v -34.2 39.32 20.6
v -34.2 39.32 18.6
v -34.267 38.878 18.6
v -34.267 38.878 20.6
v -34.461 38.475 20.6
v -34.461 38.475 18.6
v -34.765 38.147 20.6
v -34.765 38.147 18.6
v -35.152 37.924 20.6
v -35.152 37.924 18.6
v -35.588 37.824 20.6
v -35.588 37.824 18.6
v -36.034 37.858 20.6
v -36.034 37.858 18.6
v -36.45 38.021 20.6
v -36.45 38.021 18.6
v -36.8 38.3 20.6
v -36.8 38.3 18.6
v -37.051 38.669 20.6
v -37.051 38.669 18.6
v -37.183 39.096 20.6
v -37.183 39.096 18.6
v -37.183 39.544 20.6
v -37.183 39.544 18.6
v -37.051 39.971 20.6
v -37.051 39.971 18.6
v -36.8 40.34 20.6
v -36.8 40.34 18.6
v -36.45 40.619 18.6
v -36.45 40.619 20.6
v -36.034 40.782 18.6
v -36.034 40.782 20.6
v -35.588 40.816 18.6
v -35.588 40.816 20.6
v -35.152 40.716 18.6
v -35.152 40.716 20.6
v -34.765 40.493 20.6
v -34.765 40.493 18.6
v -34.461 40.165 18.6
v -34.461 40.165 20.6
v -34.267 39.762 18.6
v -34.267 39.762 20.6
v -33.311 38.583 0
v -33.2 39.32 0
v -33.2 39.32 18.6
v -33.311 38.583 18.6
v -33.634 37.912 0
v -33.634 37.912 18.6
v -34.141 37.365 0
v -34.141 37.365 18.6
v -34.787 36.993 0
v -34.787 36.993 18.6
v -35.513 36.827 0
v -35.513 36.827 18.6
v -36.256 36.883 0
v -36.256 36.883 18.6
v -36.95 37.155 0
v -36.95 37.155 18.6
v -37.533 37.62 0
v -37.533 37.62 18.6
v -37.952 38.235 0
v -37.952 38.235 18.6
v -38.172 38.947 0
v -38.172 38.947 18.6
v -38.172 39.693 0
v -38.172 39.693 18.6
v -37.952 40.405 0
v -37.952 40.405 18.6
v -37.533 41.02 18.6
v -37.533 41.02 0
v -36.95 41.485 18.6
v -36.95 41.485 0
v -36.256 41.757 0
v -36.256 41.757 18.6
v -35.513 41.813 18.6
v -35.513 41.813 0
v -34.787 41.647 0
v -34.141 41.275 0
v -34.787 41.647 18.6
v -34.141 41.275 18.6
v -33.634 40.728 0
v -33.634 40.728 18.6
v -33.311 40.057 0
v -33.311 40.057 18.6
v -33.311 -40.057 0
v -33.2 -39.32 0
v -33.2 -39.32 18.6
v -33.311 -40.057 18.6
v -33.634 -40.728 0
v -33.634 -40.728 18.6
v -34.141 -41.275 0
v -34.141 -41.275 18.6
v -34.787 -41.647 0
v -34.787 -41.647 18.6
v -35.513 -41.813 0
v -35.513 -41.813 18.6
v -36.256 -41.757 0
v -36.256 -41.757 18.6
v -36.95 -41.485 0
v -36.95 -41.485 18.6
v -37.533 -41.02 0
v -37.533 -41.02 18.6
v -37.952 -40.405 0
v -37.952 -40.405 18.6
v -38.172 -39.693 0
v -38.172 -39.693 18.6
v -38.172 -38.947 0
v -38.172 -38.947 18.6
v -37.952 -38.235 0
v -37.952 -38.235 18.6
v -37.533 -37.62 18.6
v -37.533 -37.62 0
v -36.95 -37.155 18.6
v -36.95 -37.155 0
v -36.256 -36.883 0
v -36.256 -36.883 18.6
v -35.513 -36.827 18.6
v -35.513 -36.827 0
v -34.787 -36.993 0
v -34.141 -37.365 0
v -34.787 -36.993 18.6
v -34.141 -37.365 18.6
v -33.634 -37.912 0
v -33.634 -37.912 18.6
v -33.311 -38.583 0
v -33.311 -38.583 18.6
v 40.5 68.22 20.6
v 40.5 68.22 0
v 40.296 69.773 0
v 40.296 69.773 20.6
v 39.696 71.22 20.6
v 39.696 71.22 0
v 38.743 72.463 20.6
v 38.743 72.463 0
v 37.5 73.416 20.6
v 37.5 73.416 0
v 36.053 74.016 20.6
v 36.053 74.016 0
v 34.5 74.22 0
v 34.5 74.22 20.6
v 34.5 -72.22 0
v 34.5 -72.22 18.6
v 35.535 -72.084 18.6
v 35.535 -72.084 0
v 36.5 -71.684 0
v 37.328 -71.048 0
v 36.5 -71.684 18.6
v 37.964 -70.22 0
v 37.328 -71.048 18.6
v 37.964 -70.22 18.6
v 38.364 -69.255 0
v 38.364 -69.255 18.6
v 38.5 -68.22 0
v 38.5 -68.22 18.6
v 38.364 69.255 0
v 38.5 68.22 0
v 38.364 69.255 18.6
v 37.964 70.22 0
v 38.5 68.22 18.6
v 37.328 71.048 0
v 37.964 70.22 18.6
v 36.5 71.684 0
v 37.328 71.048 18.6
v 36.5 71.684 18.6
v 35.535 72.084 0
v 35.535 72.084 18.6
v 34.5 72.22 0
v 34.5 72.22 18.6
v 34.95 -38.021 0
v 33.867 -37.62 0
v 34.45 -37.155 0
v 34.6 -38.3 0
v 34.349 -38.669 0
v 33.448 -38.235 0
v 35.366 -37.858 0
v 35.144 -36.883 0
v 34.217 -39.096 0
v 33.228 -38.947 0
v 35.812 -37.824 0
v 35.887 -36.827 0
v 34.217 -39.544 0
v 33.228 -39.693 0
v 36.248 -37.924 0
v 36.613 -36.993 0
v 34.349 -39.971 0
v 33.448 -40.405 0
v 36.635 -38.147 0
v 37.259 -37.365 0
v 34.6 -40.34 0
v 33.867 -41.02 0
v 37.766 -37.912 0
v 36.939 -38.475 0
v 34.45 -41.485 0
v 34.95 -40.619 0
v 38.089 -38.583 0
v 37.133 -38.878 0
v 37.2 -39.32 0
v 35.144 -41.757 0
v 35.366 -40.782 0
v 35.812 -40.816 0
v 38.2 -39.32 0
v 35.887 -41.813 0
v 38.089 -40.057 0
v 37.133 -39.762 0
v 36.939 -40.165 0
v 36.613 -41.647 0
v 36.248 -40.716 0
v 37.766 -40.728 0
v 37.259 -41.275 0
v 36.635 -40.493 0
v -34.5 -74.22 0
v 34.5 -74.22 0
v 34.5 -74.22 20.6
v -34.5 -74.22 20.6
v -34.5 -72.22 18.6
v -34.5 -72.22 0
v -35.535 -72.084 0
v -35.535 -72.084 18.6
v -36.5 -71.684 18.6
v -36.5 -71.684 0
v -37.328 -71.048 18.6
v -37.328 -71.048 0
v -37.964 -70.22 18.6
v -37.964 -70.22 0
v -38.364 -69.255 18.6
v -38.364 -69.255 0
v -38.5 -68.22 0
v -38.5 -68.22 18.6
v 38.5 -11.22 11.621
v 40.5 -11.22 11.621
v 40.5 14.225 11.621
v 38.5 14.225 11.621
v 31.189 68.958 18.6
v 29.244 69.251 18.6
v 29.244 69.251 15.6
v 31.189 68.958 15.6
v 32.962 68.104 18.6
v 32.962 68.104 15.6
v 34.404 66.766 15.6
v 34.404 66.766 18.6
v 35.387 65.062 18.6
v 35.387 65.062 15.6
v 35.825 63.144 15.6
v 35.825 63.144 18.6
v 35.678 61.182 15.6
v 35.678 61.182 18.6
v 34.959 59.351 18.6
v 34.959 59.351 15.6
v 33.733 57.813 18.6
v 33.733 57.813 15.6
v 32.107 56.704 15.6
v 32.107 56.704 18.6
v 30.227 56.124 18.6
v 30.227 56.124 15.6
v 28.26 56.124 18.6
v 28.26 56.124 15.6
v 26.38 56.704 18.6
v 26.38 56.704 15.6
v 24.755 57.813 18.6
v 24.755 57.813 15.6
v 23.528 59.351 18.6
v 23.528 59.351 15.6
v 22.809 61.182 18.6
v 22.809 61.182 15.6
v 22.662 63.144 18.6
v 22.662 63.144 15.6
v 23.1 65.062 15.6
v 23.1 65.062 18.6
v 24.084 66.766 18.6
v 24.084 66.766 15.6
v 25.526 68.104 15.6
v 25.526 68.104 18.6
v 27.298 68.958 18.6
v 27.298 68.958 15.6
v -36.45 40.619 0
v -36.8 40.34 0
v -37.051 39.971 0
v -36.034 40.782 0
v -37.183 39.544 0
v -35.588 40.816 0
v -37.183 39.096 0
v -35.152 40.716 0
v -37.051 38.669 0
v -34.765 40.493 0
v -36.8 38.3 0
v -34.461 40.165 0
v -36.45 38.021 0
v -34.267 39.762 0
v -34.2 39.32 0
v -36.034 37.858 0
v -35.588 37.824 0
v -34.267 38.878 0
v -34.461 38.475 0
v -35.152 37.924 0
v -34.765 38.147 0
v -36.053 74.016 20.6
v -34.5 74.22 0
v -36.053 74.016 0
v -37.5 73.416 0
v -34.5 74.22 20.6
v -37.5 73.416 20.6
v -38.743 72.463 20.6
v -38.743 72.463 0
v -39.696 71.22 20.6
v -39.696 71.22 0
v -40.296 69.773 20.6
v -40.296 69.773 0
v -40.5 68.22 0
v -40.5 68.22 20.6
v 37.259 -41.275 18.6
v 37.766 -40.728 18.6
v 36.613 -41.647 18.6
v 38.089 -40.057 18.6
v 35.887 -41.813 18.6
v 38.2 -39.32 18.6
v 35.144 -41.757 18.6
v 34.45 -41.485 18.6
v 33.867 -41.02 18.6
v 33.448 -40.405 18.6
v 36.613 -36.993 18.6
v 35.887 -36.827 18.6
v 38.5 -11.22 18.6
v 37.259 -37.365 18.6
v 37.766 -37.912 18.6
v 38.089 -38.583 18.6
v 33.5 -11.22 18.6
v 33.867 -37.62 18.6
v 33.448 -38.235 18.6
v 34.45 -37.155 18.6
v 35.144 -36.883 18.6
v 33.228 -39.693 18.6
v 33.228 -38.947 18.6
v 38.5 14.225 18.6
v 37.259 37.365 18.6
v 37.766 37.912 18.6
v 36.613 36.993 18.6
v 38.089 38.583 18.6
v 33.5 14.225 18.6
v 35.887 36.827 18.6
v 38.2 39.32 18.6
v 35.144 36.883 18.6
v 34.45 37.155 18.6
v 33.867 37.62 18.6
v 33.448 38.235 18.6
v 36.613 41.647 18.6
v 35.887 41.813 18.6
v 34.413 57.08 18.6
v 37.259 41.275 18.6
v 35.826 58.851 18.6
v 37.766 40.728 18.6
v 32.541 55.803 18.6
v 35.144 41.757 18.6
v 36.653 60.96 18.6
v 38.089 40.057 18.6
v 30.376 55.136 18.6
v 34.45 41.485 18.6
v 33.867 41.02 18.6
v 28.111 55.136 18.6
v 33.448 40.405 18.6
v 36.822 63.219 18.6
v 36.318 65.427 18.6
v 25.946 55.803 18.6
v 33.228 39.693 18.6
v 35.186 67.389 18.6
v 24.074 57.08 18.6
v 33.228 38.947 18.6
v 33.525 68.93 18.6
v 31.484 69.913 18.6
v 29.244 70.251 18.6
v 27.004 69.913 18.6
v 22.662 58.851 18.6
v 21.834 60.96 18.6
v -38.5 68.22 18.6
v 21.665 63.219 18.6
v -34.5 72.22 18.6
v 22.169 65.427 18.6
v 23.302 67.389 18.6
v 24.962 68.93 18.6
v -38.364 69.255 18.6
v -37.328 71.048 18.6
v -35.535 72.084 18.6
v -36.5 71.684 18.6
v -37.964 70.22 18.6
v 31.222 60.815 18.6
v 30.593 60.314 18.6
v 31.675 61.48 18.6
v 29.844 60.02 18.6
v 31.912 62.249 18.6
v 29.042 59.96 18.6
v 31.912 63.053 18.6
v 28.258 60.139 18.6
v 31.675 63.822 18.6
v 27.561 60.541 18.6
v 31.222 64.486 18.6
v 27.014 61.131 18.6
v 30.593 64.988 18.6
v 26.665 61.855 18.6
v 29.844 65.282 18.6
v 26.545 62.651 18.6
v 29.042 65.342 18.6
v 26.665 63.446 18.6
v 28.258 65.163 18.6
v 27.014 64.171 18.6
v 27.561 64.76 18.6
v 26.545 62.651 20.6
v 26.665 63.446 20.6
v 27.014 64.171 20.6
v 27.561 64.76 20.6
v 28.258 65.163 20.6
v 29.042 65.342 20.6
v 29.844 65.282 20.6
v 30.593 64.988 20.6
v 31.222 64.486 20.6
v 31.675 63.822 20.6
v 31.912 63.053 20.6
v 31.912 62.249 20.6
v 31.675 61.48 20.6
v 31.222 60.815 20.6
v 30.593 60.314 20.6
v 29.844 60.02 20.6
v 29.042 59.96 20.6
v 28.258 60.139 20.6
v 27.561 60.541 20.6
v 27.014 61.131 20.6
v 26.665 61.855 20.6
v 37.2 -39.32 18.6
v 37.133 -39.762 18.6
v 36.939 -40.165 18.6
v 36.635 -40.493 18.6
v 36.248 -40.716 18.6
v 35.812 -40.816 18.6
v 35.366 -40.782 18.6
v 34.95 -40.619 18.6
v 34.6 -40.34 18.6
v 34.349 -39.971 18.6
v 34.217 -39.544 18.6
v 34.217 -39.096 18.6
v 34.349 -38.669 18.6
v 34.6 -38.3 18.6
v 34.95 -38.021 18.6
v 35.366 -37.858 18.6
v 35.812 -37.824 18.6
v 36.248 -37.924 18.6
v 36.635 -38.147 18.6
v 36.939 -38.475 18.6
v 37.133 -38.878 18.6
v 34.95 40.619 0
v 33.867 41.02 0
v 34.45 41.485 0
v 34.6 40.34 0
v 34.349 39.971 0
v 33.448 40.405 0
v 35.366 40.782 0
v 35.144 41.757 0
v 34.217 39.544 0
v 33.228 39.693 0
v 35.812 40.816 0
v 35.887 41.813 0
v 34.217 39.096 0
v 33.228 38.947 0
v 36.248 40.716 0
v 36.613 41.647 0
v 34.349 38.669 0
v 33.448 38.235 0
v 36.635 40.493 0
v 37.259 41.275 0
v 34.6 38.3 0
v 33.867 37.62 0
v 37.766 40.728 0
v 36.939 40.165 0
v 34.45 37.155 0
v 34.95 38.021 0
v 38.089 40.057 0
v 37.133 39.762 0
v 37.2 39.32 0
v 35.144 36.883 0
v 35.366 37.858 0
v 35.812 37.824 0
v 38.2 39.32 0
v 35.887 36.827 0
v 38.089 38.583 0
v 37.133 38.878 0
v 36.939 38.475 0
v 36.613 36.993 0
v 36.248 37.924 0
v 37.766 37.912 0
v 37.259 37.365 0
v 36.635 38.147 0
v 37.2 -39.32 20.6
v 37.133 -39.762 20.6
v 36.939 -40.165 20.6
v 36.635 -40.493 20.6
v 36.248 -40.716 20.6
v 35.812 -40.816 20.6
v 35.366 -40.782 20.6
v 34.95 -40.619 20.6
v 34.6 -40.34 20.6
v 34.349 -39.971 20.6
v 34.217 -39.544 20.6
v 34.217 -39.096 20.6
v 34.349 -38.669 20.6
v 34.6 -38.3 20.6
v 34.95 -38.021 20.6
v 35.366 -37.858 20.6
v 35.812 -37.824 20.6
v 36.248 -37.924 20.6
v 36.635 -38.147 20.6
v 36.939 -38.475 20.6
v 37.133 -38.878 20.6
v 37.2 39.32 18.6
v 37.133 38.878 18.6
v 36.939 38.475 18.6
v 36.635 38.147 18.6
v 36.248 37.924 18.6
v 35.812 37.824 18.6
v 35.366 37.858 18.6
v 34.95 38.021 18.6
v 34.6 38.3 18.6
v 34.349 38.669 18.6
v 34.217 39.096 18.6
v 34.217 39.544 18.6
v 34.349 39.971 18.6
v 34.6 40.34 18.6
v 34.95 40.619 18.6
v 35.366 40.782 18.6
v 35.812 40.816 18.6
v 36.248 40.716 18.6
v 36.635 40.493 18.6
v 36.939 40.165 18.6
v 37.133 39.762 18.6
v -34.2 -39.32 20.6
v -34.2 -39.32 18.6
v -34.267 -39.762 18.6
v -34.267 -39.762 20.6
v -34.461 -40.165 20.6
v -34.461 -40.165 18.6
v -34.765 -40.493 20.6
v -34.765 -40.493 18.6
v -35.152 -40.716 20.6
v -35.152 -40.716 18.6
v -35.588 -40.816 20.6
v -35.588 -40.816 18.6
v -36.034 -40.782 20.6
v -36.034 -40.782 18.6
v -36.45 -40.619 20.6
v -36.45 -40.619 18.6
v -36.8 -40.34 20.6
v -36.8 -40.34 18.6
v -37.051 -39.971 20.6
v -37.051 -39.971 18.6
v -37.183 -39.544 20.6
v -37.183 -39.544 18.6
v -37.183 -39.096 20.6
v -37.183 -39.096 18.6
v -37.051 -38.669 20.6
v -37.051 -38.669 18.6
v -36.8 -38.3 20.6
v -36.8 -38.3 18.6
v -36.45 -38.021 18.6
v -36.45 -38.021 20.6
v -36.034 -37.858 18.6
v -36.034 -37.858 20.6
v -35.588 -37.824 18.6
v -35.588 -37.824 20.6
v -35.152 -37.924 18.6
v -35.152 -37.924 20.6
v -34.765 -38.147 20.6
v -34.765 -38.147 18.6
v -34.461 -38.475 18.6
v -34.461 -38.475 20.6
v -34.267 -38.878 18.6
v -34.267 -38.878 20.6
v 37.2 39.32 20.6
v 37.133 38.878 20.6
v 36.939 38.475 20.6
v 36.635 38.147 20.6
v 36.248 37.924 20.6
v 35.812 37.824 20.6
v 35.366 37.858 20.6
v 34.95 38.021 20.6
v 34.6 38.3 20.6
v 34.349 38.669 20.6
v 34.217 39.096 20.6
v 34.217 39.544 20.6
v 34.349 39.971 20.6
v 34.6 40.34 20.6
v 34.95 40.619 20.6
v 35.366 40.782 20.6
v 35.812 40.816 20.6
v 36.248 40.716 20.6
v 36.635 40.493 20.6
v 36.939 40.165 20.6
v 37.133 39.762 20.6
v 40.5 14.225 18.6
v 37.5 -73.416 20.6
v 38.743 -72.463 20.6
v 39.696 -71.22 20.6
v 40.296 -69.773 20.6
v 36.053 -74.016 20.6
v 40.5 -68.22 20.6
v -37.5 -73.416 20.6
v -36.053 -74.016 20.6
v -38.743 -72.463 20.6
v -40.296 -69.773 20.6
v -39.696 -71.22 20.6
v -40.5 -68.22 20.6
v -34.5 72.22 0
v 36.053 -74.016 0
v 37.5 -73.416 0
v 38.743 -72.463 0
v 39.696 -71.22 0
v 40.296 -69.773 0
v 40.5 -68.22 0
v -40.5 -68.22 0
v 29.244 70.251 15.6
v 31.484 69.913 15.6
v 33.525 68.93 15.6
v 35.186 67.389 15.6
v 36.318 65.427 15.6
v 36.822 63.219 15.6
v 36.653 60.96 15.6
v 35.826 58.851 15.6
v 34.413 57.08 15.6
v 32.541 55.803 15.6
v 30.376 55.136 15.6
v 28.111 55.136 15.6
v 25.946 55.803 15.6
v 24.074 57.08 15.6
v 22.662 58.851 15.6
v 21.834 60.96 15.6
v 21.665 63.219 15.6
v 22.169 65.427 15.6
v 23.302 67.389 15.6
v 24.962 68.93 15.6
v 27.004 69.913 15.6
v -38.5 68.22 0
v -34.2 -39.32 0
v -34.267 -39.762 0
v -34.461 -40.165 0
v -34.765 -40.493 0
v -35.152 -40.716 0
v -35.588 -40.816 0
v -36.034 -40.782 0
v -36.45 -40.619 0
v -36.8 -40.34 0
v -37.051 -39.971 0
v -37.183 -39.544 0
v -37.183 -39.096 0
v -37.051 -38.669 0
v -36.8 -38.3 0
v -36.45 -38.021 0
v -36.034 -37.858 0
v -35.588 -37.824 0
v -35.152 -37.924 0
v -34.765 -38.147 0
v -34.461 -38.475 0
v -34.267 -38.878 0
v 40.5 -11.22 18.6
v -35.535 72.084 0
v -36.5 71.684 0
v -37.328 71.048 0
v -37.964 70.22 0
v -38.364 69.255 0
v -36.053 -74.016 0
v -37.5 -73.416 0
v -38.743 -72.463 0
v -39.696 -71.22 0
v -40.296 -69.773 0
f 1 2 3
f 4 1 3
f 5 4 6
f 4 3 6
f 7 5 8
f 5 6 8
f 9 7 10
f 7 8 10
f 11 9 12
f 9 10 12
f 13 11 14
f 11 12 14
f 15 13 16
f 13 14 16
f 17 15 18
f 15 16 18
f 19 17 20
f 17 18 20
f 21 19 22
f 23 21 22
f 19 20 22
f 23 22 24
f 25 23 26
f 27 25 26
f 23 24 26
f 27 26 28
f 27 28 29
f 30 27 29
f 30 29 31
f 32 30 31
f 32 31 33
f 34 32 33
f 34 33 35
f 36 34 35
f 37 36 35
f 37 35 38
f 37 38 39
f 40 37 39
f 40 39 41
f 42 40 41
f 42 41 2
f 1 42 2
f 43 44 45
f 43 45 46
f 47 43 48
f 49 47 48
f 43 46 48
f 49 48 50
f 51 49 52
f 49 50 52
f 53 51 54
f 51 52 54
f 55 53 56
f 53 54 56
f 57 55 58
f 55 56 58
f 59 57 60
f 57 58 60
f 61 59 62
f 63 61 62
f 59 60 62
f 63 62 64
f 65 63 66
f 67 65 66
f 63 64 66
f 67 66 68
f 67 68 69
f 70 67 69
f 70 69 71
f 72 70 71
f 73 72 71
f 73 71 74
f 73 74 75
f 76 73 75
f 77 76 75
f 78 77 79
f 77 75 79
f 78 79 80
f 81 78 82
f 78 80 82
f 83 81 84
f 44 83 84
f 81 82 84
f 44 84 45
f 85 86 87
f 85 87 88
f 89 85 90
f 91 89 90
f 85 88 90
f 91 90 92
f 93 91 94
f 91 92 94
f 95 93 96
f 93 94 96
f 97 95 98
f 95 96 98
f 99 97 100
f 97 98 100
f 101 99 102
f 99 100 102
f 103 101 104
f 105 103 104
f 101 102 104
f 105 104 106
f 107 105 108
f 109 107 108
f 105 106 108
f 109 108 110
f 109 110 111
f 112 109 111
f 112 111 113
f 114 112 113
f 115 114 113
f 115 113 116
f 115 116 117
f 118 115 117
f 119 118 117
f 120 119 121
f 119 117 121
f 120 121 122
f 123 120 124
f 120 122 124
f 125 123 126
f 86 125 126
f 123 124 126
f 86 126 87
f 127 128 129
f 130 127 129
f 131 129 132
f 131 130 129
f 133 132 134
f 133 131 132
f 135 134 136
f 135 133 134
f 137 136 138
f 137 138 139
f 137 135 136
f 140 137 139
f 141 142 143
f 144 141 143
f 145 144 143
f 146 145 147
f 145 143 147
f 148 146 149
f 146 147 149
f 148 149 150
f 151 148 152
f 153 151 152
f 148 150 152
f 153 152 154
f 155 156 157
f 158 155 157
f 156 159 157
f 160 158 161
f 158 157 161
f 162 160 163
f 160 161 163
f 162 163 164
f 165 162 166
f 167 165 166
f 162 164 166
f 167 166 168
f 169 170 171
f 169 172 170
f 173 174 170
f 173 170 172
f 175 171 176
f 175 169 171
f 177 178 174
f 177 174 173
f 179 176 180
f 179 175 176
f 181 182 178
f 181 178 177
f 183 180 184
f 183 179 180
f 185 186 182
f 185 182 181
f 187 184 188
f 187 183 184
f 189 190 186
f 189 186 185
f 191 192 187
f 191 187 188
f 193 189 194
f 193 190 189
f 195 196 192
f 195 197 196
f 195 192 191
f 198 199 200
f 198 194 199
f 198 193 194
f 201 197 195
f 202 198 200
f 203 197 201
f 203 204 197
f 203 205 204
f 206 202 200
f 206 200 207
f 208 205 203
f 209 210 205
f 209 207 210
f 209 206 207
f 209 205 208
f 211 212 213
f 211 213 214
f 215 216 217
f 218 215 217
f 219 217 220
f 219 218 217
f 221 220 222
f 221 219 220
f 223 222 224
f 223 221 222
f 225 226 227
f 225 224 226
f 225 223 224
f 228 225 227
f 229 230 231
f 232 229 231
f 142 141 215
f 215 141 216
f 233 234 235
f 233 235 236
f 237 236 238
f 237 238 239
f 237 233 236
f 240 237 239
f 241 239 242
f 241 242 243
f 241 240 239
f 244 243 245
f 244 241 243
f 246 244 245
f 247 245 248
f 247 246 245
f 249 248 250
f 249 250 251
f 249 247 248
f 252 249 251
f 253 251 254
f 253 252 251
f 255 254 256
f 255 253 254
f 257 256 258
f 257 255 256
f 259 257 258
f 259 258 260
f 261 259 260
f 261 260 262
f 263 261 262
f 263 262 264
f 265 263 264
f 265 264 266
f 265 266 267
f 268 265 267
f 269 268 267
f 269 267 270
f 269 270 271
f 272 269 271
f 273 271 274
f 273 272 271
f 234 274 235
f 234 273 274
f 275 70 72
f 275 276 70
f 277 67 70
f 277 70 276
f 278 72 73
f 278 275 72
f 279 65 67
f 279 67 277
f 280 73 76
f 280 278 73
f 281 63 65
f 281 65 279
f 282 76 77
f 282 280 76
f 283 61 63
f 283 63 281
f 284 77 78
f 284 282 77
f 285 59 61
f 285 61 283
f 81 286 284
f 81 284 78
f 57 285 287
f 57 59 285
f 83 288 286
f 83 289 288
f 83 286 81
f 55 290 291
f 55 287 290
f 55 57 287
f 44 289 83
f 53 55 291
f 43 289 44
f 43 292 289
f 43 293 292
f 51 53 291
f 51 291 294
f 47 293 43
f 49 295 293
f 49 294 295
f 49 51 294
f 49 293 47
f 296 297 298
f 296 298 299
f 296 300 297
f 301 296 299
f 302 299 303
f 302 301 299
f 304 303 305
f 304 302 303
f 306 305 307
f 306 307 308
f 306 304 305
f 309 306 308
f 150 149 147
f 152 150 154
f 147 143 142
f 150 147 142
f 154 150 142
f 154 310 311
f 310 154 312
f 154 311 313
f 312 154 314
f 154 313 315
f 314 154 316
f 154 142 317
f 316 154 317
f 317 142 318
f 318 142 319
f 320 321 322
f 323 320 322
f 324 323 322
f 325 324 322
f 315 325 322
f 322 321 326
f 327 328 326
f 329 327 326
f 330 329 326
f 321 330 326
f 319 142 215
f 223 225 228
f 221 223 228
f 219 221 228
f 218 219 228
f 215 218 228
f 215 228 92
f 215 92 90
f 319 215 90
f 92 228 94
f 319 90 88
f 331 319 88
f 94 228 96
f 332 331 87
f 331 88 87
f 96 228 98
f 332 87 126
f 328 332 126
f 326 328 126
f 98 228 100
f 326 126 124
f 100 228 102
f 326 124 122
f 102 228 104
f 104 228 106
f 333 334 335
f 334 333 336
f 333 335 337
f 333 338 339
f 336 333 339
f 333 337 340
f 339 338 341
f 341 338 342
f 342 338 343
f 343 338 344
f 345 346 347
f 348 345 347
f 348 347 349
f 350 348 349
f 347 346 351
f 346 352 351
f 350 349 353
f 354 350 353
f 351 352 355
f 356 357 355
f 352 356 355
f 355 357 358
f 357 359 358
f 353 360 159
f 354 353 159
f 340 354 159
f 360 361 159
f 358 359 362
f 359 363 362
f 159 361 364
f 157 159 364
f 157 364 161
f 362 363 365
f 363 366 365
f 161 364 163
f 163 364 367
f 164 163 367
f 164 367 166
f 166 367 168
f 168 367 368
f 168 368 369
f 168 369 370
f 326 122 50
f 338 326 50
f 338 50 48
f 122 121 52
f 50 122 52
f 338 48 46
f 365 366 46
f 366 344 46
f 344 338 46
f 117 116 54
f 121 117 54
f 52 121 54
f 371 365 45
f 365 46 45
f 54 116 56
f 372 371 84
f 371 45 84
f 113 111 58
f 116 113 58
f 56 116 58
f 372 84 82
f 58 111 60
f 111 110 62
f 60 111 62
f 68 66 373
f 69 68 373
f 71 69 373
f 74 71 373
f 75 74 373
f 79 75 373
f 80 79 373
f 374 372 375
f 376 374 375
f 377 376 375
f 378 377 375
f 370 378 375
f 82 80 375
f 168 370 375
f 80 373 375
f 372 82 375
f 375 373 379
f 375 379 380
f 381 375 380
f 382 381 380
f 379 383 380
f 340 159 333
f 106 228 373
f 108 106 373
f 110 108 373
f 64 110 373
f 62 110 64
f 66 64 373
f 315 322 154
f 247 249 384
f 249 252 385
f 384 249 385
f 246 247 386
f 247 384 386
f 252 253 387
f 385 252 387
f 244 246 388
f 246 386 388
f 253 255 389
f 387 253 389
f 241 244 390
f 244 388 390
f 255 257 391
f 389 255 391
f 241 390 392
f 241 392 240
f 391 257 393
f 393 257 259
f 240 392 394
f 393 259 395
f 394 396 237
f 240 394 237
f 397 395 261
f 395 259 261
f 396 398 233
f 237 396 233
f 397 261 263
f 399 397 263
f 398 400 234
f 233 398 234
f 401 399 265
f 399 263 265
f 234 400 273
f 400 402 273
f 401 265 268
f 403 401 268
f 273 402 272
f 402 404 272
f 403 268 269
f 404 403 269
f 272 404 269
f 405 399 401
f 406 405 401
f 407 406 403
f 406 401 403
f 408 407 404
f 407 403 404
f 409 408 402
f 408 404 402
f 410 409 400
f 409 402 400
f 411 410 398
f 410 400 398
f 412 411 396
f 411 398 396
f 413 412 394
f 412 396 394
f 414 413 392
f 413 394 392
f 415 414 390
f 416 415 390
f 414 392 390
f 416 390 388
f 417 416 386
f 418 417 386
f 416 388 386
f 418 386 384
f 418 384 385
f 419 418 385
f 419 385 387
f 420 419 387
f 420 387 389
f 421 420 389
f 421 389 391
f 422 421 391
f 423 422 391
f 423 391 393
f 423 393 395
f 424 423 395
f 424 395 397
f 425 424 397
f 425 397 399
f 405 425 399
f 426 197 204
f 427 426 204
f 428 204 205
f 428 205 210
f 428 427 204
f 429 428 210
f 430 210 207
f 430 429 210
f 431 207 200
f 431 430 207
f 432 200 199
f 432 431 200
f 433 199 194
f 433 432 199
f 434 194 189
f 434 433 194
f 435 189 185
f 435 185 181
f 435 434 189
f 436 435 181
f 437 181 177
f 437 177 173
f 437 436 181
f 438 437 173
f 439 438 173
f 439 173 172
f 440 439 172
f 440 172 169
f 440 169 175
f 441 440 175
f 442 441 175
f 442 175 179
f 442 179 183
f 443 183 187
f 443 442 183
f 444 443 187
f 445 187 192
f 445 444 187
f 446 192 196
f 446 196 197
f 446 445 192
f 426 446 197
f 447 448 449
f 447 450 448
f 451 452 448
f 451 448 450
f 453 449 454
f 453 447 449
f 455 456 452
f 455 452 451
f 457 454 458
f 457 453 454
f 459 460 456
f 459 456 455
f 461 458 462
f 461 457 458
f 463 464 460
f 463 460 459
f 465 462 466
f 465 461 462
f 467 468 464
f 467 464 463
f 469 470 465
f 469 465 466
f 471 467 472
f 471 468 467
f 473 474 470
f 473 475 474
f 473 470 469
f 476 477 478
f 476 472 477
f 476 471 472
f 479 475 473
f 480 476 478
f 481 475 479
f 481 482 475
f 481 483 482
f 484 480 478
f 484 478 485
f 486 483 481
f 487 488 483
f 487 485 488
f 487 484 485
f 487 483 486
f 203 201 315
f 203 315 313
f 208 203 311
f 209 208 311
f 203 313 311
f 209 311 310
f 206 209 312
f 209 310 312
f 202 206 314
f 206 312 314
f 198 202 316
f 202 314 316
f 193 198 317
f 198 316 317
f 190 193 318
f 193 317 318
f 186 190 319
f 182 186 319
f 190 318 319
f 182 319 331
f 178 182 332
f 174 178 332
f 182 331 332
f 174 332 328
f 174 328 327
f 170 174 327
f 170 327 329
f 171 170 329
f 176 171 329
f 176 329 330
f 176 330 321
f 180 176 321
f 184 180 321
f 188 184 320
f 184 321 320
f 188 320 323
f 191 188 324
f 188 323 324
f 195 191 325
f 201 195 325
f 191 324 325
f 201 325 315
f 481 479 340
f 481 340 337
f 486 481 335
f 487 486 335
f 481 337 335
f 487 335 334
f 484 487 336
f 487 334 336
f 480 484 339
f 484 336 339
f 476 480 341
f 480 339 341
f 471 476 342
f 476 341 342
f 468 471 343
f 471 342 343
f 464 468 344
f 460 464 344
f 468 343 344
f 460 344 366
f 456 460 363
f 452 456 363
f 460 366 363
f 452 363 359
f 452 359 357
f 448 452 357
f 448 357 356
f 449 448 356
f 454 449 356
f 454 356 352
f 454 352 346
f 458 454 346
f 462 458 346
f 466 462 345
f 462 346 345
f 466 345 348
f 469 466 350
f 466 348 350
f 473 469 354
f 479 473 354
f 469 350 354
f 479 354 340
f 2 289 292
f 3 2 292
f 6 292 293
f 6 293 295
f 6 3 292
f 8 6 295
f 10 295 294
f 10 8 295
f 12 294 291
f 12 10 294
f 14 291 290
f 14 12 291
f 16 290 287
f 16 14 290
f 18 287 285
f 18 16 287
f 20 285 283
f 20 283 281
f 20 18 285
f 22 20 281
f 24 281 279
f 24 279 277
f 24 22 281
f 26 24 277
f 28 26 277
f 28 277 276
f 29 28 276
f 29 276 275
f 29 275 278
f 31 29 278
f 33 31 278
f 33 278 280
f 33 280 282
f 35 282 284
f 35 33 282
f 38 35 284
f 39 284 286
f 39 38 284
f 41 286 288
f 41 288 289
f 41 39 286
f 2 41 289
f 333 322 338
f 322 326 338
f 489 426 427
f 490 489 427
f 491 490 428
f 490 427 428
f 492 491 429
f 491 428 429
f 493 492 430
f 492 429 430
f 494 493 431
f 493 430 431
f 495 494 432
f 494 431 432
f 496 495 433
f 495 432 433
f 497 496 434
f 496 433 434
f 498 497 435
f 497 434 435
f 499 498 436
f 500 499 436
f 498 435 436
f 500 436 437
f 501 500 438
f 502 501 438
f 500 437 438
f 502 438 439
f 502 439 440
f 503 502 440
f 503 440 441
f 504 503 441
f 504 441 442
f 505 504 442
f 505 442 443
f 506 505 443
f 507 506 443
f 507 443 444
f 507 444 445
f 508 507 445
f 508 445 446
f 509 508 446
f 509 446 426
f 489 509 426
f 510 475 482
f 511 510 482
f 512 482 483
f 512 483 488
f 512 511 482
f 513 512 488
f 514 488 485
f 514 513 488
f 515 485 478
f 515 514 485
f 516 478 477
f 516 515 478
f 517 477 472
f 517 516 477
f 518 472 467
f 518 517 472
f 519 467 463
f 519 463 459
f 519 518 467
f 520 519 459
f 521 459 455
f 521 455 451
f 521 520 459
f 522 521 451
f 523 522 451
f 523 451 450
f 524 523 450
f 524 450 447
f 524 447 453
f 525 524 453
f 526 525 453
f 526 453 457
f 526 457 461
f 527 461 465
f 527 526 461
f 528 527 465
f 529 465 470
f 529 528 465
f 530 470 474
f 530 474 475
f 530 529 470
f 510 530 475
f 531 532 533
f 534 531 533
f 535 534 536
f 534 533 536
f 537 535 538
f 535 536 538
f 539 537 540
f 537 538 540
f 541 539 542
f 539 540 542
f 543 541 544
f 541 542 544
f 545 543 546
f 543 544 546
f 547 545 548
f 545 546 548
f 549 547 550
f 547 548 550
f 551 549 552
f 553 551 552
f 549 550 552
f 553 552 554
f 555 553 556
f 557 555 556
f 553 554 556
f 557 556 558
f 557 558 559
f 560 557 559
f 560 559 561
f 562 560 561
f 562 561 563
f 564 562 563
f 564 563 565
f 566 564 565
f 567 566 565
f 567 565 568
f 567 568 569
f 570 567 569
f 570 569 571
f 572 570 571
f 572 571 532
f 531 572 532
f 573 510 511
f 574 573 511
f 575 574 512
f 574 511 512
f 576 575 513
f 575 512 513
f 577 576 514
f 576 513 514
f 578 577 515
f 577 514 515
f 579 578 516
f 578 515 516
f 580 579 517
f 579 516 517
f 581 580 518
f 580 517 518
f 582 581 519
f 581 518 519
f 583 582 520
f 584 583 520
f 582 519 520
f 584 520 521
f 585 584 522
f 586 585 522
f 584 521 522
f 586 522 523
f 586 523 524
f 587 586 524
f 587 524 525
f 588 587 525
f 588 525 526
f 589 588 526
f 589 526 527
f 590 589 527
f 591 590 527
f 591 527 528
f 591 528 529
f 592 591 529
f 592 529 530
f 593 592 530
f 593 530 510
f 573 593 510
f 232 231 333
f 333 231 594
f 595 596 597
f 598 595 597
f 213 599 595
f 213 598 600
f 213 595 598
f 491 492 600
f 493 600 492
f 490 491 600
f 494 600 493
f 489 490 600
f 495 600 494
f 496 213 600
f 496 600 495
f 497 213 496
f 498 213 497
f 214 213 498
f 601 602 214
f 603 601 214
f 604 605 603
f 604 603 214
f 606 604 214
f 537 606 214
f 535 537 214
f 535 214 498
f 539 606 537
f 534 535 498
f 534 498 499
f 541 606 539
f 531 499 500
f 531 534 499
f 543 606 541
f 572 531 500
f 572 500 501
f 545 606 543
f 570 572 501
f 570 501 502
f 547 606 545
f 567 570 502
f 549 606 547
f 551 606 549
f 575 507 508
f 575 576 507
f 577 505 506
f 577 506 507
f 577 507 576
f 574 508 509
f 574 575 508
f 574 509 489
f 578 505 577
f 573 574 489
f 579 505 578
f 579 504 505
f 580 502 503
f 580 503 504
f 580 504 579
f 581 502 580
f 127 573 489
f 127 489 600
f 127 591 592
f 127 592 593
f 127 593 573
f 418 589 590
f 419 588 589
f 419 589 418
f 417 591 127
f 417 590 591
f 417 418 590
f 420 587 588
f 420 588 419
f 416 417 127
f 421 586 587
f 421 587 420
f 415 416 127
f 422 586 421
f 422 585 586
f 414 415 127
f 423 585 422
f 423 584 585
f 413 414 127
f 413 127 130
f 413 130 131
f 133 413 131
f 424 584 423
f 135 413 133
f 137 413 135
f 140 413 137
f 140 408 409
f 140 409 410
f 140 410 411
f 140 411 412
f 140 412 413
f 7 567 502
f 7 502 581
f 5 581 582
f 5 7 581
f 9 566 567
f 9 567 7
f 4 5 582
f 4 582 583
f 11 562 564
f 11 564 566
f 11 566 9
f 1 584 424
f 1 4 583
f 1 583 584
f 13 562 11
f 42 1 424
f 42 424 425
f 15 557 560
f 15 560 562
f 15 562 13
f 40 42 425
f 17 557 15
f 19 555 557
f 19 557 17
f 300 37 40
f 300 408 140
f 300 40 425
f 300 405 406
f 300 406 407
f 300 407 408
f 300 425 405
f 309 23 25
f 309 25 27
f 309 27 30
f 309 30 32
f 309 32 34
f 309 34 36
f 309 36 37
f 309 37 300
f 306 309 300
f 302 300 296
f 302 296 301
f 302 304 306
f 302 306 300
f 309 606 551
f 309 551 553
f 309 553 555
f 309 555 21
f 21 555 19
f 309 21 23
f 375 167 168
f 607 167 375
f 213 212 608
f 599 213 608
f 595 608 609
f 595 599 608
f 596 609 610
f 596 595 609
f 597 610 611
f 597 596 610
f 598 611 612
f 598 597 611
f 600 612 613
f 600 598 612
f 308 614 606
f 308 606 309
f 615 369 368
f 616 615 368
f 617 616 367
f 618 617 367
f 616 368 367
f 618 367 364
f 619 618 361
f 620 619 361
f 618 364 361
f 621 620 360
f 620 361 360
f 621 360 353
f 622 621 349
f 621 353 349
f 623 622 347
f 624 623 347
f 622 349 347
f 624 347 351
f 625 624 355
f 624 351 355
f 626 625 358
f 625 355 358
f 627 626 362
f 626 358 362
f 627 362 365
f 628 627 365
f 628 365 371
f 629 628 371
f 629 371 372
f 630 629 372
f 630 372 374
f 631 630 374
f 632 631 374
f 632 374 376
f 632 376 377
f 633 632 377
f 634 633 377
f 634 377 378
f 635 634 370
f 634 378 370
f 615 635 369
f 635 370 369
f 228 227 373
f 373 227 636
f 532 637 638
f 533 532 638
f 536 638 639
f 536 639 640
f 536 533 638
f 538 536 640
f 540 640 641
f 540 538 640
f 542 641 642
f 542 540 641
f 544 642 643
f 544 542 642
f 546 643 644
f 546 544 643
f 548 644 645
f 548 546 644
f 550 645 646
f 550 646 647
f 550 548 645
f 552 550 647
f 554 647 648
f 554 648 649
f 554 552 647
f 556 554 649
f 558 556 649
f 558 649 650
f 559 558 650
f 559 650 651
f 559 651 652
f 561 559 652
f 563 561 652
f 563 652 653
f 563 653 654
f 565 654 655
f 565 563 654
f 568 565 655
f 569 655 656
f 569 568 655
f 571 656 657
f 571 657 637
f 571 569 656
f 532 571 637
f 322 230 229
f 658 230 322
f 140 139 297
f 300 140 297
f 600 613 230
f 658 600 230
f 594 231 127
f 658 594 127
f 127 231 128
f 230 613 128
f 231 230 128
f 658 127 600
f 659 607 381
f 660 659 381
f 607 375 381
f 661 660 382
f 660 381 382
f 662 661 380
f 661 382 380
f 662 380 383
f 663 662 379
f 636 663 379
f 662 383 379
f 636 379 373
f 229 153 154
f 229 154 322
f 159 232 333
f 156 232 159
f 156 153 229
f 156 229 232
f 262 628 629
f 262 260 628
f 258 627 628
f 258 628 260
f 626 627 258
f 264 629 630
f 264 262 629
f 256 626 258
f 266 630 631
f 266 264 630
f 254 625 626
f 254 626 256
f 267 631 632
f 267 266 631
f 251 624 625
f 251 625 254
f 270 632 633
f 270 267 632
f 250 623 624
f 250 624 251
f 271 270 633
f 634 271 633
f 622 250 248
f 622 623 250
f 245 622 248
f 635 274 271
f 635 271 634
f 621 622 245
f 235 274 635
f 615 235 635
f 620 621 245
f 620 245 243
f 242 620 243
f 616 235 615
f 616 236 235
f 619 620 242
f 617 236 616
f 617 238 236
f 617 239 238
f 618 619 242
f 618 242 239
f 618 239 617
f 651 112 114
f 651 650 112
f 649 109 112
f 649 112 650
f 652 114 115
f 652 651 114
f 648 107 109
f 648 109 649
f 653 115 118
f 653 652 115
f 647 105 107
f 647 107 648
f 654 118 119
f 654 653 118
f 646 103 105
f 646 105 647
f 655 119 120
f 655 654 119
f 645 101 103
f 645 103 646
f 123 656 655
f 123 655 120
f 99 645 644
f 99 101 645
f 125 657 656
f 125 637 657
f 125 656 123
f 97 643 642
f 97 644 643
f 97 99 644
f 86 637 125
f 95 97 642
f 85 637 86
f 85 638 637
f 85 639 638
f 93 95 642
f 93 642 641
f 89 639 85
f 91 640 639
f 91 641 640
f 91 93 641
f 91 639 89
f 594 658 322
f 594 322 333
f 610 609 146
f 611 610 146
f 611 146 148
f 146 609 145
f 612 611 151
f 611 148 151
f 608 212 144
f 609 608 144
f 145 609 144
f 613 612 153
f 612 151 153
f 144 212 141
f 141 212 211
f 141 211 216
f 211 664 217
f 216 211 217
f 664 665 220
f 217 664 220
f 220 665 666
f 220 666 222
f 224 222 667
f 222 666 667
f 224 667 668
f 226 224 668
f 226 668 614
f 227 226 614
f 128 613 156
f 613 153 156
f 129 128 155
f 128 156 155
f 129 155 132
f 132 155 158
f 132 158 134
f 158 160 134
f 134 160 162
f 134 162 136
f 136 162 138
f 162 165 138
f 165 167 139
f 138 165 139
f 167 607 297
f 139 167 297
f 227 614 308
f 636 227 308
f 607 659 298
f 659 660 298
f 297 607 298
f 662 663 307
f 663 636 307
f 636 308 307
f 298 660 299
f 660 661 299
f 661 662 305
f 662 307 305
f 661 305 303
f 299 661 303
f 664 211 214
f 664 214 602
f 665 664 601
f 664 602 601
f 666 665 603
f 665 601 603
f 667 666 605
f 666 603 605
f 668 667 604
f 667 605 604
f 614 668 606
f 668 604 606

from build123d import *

# Parameters (mm, degrees)
SKIZZE2_W                       = 148.44
SKIZZE2_H                       = 81
AUFSATZ_LINEAR_AUSTRAGEN1_DEPTH = 20.6
VERRUNDUNG2_R                   = 6
WANDUNG2_T                      = -2
VERST_RKUNGSRIPPE11_START       = -18.6
VERST_RKUNGSRIPPE11_OUTLINE_R   = 2.5
VERST_RKUNGSRIPPE11_OUTLINE_R_2 = 1.5
VERST_RKUNGSRIPPE11_DEPTH       = 18.6
VERST_RKUNGSRIPPE17_START       = -3
VERST_RKUNGSRIPPE17_OUTLINE_R   = 7.6
VERST_RKUNGSRIPPE17_OUTLINE_R_2 = 6.6
VERST_RKUNGSRIPPE17_DEPTH       = 3
SKIZZE31_R                      = 2.698446287
SCHNITT_LINEAR_AUSTRAGEN4_DEPTH = 87.572619228
SKIZZE32_R                      = 1.5
SCHNITT_LINEAR_AUSTRAGEN5_DEPTH = 87.572619228
SKIZZE33_W                      = 25.444588161
SKIZZE33_H                      = 6.979087038
SCHNITT_LINEAR_AUSTRAGEN6_DEPTH = 7


# Read off the part's stored shape, not the designer's step: Verstärkungsrippe11, Verstärkungsrippe17
with BuildPart() as part:
    # Skizze2 → Aufsatz-Linear austragen1 (new body)
    with BuildSketch(Plane(origin=(0, 0, 0), x_dir=(0, 1, 0), z_dir=(0, 0, 1))):
        Rectangle(SKIZZE2_W, SKIZZE2_H)
    extrude(amount=AUFSATZ_LINEAR_AUSTRAGEN1_DEPTH)

    # Verrundung2
    verrundung2_edges = [part.edges().sort_by_distance(p)[0] for p in [
        (40.5, 74.22, 10.3),
        (40.5, -74.22, 10.3),
        (-40.5, -74.22, 10.3),
        (-40.5, 74.22, 10.3),
    ]]
    fillet(verrundung2_edges, radius=VERRUNDUNG2_R)

    # Wandung2
    wandung2_openings = [part.faces().sort_by_distance(p)[0] for p in [
        (0, 0, 0),
    ]]
    offset(amount=WANDUNG2_T, openings=wandung2_openings, kind=Kind.INTERSECTION)

    # Verstärkungsrippe11 outline → Verstärkungsrippe11 (add)
    # profile 1 of 4: a face of its own
    with BuildSketch(Plane(origin=(0, 0, 0), x_dir=(1, 0, 0), z_dir=(0, 0, -1)).offset(VERST_RKUNGSRIPPE11_START)):
        with Locations((-35.7, 39.32)):
            Circle(VERST_RKUNGSRIPPE11_OUTLINE_R)
        with Locations((-35.7, 39.32)):
            Circle(VERST_RKUNGSRIPPE11_OUTLINE_R_2, mode=Mode.SUBTRACT)
    # profile 2 of 4: a face of its own
    with BuildSketch(Plane(origin=(0, 0, 0), x_dir=(1, 0, 0), z_dir=(0, 0, -1)).offset(VERST_RKUNGSRIPPE11_START)):
        with Locations((35.7, 39.32)):
            Circle(VERST_RKUNGSRIPPE11_OUTLINE_R)
        with Locations((35.7, 39.32)):
            Circle(VERST_RKUNGSRIPPE11_OUTLINE_R_2, mode=Mode.SUBTRACT)
    # profile 3 of 4: a face of its own
    with BuildSketch(Plane(origin=(0, 0, 0), x_dir=(1, 0, 0), z_dir=(0, 0, -1)).offset(VERST_RKUNGSRIPPE11_START)):
        with Locations((35.7, -39.32)):
            Circle(VERST_RKUNGSRIPPE11_OUTLINE_R)
        with Locations((35.7, -39.32)):
            Circle(VERST_RKUNGSRIPPE11_OUTLINE_R_2, mode=Mode.SUBTRACT)
    # profile 4 of 4: a face of its own
    with BuildSketch(Plane(origin=(0, 0, 0), x_dir=(1, 0, 0), z_dir=(0, 0, -1)).offset(VERST_RKUNGSRIPPE11_START)):
        with Locations((-35.7, -39.32)):
            Circle(VERST_RKUNGSRIPPE11_OUTLINE_R)
        with Locations((-35.7, -39.32)):
            Circle(VERST_RKUNGSRIPPE11_OUTLINE_R_2, mode=Mode.SUBTRACT)
    extrude(amount=VERST_RKUNGSRIPPE11_DEPTH)

    # Verstärkungsrippe17 outline → Verstärkungsrippe17 (add)
    with BuildSketch(Plane.YX.offset(-15.6).offset(VERST_RKUNGSRIPPE17_START)):
        with Locations((62.650739245, 29.243709866)):
            Circle(VERST_RKUNGSRIPPE17_OUTLINE_R)
        with Locations((62.650739245, 29.243709866)):
            Circle(VERST_RKUNGSRIPPE17_OUTLINE_R_2, mode=Mode.SUBTRACT)
    extrude(amount=VERST_RKUNGSRIPPE17_DEPTH)

    # Skizze31 → Schnitt-Linear austragen4 (cut, through all)
    with BuildSketch(Plane(origin=(0, 0, 18.6), x_dir=(1, 0, 0), z_dir=(0, 0, -1))):
        with Locations(Location((29.243709866, -62.650739245, 0), (0, 0, 180))):
            Circle(SKIZZE31_R)
    extrude(amount=-SCHNITT_LINEAR_AUSTRAGEN4_DEPTH, mode=Mode.SUBTRACT)

    # Skizze32 → Schnitt-Linear austragen5 (cut, through all)
    with BuildSketch(Plane(origin=(0, 0, 18.6), x_dir=(1, 0, 0), z_dir=(0, 0, -1))):
        with Locations((-35.7, 39.32)):
            Circle(SKIZZE32_R)
        with Locations((35.7, 39.32)):
            Circle(SKIZZE32_R)
        with Locations((35.7, -39.32)):
            Circle(SKIZZE32_R)
        with Locations((-35.7, -39.32)):
            Circle(SKIZZE32_R)
    extrude(amount=-SCHNITT_LINEAR_AUSTRAGEN5_DEPTH, mode=Mode.SUBTRACT)

    # Skizze33 → Schnitt-Linear austragen6 (cut)
    with BuildSketch(Plane.YZ.offset(40.5)):
        with Locations((1.502294081, 15.110456481)):
            Rectangle(SKIZZE33_W, SKIZZE33_H)
    extrude(amount=-SCHNITT_LINEAR_AUSTRAGEN6_DEPTH, mode=Mode.SUBTRACT)


solid = part.part
